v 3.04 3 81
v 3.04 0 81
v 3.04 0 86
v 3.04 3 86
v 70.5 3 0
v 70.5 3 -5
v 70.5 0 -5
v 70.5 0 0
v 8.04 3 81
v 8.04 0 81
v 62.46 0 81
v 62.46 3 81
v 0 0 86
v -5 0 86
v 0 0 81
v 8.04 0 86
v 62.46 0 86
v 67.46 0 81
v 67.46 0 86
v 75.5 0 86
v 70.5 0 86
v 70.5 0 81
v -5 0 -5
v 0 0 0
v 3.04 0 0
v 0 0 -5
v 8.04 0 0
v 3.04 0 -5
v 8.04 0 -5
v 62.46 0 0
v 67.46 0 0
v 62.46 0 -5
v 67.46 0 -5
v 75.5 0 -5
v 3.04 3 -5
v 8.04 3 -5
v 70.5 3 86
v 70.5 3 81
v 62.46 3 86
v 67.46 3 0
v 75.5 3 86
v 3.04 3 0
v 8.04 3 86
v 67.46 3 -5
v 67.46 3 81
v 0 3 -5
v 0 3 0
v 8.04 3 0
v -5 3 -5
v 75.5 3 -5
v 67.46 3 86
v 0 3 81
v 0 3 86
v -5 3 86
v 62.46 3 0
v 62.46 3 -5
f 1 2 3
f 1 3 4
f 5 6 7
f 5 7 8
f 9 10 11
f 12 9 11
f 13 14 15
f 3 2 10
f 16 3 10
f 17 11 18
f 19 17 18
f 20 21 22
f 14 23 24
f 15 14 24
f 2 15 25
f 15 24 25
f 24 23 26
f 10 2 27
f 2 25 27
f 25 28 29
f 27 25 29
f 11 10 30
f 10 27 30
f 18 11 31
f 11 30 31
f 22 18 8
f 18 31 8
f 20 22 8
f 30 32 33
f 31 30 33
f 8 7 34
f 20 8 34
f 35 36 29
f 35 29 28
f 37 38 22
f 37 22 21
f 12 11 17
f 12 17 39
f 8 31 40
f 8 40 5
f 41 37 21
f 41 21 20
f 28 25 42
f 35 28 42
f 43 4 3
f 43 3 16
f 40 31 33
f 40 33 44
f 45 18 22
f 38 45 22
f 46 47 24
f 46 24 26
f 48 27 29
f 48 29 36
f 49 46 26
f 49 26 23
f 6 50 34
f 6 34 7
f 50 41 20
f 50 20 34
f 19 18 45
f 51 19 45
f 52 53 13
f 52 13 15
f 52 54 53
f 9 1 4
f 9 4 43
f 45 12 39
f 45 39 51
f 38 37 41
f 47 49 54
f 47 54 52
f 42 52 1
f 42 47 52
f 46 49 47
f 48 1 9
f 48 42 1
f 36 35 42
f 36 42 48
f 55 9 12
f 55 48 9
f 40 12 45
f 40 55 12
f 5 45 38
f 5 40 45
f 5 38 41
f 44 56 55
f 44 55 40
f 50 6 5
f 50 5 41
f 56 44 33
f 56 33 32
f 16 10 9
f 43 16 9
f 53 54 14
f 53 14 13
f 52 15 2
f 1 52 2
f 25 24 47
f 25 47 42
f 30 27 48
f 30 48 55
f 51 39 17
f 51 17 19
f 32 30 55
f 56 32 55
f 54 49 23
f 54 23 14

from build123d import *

# Parameters (mm, degrees)
SKETCH1_W           = 70.5
SKETCH1_H           = 81
BOSS_EXTRUDE1_DEPTH = 3
SKETCH2_W           = 5
SKETCH2_H           = 3
BOSS_EXTRUDE2_DEPTH = 5
SKETCH3_W           = 5
SKETCH3_H           = 3
BOSS_EXTRUDE3_DEPTH = 5
BOSS_EXTRUDE4_DEPTH = 3


with BuildPart() as part:
    # Sketch1 → Boss-Extrude1 (new body)
    with BuildSketch(Plane(origin=(0, 0, 0), x_dir=(1, 0, 0), z_dir=(0, 1, 0))):
        with Locations((35.25, -40.5)):
            Rectangle(SKETCH1_W, SKETCH1_H)
    extrude(amount=BOSS_EXTRUDE1_DEPTH)

    # Sketch2 → Boss-Extrude2 (add)
    with BuildSketch(Plane.XY.offset(81)):
        with Locations((5.54, 1.5)):
            Rectangle(SKETCH2_W, SKETCH2_H)
        with Locations((64.96, 1.5)):
            Rectangle(SKETCH2_W, SKETCH2_H)
    extrude(amount=BOSS_EXTRUDE2_DEPTH)

    # Sketch3 → Boss-Extrude3 (add)
    with BuildSketch(Plane(origin=(0, 0, 0), x_dir=(-1, 0, 0), z_dir=(0, 0, -1))):
        with Locations((-5.54, 1.5)):
            Rectangle(SKETCH3_W, SKETCH3_H)
        with Locations((-64.96, 1.5)):
            Rectangle(SKETCH3_W, SKETCH3_H)
    extrude(amount=BOSS_EXTRUDE3_DEPTH)

    # Sketch4 → Boss-Extrude4 (add)
    with BuildSketch(Plane(origin=(0, 3, 0), x_dir=(1, 0, 0), z_dir=(0, 1, 0))):
        Polygon((0, 0), (0, 5), (-5, 5), (-5, -86), (0, -86), (0, -81), align=None)
        Polygon((70.5, 5), (70.5, 0), (70.5, -81), (70.5, -86), (75.5, -86), (75.5, 0), (75.5, 5), align=None)
    extrude(amount=-BOSS_EXTRUDE4_DEPTH)


solid = part.part
